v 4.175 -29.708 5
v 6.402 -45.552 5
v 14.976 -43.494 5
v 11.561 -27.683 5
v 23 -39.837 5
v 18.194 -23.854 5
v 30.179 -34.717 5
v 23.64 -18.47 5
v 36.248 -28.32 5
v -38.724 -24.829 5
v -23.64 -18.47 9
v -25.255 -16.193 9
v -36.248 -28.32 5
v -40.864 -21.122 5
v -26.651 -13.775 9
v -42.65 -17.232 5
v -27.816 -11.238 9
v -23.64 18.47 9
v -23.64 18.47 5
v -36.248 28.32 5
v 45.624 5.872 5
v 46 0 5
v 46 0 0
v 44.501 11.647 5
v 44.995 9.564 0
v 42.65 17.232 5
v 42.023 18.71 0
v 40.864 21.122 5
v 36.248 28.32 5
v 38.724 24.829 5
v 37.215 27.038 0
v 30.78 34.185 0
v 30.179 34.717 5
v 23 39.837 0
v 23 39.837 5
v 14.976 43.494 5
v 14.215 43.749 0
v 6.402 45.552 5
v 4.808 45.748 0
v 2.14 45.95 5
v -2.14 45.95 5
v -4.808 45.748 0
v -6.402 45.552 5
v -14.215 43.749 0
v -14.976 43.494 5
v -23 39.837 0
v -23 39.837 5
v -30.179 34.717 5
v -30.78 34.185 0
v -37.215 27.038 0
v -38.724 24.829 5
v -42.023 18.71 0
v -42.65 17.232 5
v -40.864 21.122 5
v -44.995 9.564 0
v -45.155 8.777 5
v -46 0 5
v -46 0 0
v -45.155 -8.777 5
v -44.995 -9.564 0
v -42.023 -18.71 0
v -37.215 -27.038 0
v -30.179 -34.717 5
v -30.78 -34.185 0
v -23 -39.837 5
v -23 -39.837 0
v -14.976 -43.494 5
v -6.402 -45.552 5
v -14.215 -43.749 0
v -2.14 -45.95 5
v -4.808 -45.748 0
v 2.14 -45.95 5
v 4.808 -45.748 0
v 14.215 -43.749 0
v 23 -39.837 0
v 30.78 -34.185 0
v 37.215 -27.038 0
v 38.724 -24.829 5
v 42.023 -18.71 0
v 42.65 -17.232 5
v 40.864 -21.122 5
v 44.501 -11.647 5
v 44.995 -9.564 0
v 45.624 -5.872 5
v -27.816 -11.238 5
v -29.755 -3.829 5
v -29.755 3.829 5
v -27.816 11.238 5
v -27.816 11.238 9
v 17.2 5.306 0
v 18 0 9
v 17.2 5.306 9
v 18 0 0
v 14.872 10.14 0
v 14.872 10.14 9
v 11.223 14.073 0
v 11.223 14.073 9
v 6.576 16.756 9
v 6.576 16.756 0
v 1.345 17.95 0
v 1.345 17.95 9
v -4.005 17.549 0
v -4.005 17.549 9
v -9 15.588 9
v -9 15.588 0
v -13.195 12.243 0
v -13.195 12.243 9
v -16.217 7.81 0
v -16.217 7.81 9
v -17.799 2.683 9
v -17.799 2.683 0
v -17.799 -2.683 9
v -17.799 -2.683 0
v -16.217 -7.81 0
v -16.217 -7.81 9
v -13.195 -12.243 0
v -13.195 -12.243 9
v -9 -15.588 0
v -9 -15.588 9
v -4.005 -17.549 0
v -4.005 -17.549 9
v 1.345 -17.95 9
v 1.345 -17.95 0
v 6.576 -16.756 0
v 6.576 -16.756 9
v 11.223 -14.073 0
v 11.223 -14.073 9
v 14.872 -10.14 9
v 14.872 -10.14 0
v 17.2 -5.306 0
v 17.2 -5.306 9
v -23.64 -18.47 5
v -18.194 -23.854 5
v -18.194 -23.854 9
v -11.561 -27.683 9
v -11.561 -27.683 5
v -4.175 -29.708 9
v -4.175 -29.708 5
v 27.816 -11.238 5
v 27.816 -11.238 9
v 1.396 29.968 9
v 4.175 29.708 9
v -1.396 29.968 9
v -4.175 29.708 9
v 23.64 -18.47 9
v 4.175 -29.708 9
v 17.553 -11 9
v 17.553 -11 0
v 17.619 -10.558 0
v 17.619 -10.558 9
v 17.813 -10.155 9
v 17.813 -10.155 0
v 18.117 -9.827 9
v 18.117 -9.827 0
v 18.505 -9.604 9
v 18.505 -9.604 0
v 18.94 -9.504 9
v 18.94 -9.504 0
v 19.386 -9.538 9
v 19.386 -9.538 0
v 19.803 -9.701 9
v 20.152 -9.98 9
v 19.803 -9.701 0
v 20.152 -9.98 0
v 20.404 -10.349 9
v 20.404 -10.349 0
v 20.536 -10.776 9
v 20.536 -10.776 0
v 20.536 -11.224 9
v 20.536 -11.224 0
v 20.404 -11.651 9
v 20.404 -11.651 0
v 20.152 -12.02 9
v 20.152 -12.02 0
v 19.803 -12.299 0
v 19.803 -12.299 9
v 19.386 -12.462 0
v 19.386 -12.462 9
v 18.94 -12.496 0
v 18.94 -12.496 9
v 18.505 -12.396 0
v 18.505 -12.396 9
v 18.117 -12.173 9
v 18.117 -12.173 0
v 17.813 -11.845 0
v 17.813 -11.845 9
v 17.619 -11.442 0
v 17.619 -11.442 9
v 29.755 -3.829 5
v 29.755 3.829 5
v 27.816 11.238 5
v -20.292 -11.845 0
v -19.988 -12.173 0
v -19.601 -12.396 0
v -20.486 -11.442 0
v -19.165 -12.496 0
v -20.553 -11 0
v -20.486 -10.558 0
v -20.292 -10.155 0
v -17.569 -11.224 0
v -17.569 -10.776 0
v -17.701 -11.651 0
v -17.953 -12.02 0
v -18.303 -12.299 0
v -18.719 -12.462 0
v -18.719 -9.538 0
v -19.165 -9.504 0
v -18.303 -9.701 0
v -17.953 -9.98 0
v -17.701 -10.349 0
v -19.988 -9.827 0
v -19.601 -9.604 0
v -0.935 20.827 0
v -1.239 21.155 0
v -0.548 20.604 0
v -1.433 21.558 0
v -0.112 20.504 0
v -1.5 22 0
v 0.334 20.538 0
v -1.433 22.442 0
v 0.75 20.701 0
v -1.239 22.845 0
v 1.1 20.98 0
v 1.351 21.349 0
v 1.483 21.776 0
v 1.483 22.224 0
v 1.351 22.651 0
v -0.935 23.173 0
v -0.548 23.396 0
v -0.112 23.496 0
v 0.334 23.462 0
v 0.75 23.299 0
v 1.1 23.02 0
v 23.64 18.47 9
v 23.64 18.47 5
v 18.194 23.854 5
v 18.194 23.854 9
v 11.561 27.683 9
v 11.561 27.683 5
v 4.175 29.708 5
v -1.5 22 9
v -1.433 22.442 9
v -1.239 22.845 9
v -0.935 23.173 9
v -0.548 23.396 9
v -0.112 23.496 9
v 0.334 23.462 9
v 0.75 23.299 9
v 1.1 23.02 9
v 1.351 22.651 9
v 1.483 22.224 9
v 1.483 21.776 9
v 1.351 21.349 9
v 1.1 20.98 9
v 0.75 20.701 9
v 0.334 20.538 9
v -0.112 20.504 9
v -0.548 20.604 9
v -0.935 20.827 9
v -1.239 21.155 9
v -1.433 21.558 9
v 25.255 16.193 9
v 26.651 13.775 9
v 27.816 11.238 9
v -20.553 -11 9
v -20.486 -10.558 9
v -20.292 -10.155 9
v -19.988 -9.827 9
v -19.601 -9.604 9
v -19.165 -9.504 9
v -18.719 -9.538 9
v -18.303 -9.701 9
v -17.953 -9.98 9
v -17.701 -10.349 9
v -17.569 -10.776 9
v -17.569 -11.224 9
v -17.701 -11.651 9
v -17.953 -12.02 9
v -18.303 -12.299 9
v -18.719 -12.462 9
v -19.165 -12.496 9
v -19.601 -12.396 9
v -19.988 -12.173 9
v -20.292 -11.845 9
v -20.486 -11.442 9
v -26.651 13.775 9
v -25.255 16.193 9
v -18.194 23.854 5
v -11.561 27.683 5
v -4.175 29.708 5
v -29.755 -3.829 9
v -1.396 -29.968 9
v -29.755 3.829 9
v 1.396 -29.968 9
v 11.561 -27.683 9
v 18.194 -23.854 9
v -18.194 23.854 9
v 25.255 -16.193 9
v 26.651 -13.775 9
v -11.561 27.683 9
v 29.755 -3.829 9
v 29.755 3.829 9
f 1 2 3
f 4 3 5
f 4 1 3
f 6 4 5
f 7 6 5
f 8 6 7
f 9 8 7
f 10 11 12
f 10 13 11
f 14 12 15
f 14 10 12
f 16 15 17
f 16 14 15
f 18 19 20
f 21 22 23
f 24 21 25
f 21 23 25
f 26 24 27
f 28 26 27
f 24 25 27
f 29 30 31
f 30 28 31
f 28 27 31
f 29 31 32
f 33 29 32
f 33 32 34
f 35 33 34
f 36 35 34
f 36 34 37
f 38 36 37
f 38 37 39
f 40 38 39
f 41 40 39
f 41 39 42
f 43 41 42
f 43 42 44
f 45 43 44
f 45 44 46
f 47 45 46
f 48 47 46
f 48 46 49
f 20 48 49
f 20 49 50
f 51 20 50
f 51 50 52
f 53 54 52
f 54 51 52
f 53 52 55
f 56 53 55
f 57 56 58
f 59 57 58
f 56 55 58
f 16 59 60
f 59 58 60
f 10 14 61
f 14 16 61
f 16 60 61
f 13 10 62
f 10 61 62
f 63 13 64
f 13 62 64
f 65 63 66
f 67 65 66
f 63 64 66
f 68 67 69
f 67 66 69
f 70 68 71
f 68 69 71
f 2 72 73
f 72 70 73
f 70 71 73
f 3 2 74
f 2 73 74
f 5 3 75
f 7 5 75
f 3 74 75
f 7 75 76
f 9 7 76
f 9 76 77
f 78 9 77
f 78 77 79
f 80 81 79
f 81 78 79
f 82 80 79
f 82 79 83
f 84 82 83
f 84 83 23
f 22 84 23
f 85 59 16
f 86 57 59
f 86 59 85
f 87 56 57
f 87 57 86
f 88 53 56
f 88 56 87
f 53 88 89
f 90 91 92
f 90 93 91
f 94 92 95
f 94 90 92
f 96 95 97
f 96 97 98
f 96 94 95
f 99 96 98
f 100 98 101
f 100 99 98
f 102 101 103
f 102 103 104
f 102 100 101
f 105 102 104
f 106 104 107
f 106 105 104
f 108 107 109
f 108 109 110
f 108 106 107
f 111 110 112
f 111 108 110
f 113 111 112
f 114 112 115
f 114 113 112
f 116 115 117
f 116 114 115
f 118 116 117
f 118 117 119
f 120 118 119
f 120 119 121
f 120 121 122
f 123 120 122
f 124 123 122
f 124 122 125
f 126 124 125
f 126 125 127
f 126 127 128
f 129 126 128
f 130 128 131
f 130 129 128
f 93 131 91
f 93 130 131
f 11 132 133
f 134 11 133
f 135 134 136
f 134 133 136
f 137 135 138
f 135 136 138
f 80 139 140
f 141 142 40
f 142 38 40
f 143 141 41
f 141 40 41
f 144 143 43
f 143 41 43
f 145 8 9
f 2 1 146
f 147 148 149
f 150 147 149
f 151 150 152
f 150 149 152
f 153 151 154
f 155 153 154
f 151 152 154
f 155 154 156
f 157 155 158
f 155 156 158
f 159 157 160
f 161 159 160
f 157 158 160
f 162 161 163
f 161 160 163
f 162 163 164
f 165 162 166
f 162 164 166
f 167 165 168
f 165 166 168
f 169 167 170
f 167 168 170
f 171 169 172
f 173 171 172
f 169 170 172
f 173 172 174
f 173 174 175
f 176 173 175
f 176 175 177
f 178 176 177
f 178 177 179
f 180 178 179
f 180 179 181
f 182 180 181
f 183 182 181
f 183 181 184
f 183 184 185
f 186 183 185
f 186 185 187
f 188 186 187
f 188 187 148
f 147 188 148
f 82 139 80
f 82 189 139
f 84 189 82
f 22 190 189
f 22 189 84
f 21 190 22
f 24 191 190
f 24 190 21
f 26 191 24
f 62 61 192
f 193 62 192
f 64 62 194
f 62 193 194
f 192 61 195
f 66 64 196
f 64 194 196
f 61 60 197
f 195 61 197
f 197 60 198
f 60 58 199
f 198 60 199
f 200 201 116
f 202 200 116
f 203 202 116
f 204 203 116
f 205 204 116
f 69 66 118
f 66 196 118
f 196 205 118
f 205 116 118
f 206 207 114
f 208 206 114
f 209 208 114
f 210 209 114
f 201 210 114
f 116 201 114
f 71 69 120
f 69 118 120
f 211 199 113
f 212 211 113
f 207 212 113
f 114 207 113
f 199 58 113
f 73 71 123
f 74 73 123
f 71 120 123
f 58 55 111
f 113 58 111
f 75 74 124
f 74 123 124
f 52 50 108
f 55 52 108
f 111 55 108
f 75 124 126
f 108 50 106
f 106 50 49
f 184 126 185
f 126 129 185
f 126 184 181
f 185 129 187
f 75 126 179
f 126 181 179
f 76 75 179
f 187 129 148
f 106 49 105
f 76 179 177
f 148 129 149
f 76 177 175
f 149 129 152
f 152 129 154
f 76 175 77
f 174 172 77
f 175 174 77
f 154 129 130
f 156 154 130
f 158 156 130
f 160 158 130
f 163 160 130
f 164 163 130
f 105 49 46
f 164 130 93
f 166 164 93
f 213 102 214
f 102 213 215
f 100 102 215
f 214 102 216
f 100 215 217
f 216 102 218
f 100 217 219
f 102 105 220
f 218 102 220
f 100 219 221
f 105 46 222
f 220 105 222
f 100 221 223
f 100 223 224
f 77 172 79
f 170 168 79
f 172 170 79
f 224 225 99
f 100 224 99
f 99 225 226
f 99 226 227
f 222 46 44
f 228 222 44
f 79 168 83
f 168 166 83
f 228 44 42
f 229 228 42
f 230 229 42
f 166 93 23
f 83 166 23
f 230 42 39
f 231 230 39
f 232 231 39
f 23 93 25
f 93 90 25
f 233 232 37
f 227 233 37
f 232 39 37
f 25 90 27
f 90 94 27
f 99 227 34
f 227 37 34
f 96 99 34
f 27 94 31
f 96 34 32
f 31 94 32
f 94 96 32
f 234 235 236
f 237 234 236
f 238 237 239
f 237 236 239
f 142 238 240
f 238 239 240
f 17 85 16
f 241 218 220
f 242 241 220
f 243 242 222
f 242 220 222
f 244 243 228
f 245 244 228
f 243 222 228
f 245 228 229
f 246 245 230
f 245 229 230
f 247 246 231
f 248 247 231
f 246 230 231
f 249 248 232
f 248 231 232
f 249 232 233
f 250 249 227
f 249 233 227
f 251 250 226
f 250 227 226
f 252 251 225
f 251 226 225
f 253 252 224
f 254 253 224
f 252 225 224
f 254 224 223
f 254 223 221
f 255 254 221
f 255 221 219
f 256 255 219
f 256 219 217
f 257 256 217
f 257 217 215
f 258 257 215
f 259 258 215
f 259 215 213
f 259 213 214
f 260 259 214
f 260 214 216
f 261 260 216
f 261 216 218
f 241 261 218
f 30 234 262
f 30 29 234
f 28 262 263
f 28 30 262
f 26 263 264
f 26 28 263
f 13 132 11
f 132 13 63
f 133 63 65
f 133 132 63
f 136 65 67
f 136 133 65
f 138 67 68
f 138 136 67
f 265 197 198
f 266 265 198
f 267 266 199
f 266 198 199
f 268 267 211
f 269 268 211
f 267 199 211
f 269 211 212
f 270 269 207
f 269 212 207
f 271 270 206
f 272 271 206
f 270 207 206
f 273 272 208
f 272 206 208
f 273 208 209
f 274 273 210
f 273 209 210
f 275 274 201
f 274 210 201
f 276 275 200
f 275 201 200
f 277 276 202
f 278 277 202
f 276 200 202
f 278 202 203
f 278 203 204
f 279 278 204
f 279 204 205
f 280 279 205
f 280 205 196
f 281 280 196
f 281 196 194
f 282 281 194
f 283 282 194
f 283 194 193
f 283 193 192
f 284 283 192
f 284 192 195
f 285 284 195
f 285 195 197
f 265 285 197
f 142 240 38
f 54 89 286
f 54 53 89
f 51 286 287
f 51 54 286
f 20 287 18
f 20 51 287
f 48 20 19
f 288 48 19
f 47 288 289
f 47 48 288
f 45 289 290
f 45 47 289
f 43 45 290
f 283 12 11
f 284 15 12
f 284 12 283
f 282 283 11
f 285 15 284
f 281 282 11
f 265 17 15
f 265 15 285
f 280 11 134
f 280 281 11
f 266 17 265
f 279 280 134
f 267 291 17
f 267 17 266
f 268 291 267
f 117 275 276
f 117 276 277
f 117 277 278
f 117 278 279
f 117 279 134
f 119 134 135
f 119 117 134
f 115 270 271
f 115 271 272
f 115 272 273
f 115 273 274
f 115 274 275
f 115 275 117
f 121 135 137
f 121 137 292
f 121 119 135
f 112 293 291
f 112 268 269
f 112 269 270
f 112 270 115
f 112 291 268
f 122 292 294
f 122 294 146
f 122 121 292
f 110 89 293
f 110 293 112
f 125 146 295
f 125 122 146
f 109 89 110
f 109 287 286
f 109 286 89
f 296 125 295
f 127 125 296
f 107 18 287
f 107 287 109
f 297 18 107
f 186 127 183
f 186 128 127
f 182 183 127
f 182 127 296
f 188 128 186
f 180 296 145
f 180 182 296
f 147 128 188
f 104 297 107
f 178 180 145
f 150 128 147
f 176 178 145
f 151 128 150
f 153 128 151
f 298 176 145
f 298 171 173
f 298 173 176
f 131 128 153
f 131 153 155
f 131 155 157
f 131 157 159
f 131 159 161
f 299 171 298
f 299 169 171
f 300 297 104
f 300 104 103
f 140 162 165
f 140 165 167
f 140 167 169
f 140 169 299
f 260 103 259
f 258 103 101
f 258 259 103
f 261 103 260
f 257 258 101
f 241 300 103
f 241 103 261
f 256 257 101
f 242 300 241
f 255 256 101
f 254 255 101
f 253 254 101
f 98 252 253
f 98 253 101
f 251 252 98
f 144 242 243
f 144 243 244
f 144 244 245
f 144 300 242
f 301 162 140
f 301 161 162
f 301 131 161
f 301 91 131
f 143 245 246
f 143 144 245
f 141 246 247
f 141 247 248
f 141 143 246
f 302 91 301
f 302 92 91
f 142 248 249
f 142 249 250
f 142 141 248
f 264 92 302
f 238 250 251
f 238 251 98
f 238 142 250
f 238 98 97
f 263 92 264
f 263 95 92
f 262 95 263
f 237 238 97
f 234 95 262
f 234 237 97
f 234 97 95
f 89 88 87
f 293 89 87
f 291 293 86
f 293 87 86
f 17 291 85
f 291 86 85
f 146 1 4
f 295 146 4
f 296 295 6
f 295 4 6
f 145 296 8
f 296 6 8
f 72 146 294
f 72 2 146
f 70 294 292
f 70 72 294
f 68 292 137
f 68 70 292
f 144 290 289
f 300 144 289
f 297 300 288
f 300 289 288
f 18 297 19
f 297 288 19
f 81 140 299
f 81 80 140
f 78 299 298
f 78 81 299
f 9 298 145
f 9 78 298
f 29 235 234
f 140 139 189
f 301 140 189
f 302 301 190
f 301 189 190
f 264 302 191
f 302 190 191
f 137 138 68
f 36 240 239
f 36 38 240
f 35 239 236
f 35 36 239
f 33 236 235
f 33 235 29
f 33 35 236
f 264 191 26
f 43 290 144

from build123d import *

# Parameters (mm, degrees)
SKETCH2_R               = 46
SKETCH2_R_2             = 18
BOSS_EXTRUDE2_DEPTH     = 5
SKETCH4_R               = 30
SKETCH4_R_2             = 18
BOSS_EXTRUDE3_DEPTH     = 4
SKETCH5_R               = 1.5
CUT_EXTRUDE1_DEPTH      = 66.673434507
CUT_EXTRUDE1_DEPTH_BACK = 66.673434507
REVOLVE1_ANGLE          = 16
CIRPATTERN1_COUNT       = 6


with BuildPart() as part:
    # Sketch2 → Boss-Extrude2 (new body)
    with BuildSketch(Plane.XY):
        Circle(SKETCH2_R)
        Circle(SKETCH2_R_2, mode=Mode.SUBTRACT)
    extrude(amount=BOSS_EXTRUDE2_DEPTH)

    # Sketch4 → Boss-Extrude3 (add)
    with BuildSketch(Plane.XY.offset(5)):
        Circle(SKETCH4_R)
        Circle(SKETCH4_R_2, mode=Mode.SUBTRACT)
    extrude(amount=BOSS_EXTRUDE3_DEPTH)

    # Sketch5 → Cut-Extrude1 (cut, two sides)
    with BuildSketch(Plane(origin=(0, 0, 0), x_dir=(-1, 0, 0), z_dir=(0, 0, -1))) as cut_extrude1_sk:
        with Locations((0, 22)):
            Circle(SKETCH5_R)
        with Locations((19.052558883, -11)):
            Circle(SKETCH5_R)
        with Locations((-19.052558883, -11)):
            Circle(SKETCH5_R)
    extrude(amount=CUT_EXTRUDE1_DEPTH, mode=Mode.SUBTRACT)
    extrude(cut_extrude1_sk.sketch, amount=-CUT_EXTRUDE1_DEPTH_BACK, mode=Mode.SUBTRACT)

    # Sketch6 → Revolve1 (revolve, symmetric)
    with BuildSketch(Plane(origin=(0, 0, 0), x_dir=(0, 0, -1), z_dir=(1, 0, 0))) as revolve1_sk:
        Polygon((-5, 30), (-9, 30), (-5, 46), align=None)
    revolve1 = revolve(axis=Axis((0, 0, 0), (0, 0, -1)), revolution_arc=REVOLVE1_ANGLE / 2)
    revolve1 = revolve1 + revolve(revolve1_sk.sketch, axis=Axis((0, 0, 0), (0, 0, 1)), revolution_arc=REVOLVE1_ANGLE / 2)

    # CirPattern1: Revolve1 ×6 about axis
    cirpattern1_axis = Axis((0, 0, 0), (0, 0, 1))
    for i in range(1, CIRPATTERN1_COUNT):
        add(revolve1.rotate(cirpattern1_axis, i * 360 / CIRPATTERN1_COUNT))


solid = part.part
